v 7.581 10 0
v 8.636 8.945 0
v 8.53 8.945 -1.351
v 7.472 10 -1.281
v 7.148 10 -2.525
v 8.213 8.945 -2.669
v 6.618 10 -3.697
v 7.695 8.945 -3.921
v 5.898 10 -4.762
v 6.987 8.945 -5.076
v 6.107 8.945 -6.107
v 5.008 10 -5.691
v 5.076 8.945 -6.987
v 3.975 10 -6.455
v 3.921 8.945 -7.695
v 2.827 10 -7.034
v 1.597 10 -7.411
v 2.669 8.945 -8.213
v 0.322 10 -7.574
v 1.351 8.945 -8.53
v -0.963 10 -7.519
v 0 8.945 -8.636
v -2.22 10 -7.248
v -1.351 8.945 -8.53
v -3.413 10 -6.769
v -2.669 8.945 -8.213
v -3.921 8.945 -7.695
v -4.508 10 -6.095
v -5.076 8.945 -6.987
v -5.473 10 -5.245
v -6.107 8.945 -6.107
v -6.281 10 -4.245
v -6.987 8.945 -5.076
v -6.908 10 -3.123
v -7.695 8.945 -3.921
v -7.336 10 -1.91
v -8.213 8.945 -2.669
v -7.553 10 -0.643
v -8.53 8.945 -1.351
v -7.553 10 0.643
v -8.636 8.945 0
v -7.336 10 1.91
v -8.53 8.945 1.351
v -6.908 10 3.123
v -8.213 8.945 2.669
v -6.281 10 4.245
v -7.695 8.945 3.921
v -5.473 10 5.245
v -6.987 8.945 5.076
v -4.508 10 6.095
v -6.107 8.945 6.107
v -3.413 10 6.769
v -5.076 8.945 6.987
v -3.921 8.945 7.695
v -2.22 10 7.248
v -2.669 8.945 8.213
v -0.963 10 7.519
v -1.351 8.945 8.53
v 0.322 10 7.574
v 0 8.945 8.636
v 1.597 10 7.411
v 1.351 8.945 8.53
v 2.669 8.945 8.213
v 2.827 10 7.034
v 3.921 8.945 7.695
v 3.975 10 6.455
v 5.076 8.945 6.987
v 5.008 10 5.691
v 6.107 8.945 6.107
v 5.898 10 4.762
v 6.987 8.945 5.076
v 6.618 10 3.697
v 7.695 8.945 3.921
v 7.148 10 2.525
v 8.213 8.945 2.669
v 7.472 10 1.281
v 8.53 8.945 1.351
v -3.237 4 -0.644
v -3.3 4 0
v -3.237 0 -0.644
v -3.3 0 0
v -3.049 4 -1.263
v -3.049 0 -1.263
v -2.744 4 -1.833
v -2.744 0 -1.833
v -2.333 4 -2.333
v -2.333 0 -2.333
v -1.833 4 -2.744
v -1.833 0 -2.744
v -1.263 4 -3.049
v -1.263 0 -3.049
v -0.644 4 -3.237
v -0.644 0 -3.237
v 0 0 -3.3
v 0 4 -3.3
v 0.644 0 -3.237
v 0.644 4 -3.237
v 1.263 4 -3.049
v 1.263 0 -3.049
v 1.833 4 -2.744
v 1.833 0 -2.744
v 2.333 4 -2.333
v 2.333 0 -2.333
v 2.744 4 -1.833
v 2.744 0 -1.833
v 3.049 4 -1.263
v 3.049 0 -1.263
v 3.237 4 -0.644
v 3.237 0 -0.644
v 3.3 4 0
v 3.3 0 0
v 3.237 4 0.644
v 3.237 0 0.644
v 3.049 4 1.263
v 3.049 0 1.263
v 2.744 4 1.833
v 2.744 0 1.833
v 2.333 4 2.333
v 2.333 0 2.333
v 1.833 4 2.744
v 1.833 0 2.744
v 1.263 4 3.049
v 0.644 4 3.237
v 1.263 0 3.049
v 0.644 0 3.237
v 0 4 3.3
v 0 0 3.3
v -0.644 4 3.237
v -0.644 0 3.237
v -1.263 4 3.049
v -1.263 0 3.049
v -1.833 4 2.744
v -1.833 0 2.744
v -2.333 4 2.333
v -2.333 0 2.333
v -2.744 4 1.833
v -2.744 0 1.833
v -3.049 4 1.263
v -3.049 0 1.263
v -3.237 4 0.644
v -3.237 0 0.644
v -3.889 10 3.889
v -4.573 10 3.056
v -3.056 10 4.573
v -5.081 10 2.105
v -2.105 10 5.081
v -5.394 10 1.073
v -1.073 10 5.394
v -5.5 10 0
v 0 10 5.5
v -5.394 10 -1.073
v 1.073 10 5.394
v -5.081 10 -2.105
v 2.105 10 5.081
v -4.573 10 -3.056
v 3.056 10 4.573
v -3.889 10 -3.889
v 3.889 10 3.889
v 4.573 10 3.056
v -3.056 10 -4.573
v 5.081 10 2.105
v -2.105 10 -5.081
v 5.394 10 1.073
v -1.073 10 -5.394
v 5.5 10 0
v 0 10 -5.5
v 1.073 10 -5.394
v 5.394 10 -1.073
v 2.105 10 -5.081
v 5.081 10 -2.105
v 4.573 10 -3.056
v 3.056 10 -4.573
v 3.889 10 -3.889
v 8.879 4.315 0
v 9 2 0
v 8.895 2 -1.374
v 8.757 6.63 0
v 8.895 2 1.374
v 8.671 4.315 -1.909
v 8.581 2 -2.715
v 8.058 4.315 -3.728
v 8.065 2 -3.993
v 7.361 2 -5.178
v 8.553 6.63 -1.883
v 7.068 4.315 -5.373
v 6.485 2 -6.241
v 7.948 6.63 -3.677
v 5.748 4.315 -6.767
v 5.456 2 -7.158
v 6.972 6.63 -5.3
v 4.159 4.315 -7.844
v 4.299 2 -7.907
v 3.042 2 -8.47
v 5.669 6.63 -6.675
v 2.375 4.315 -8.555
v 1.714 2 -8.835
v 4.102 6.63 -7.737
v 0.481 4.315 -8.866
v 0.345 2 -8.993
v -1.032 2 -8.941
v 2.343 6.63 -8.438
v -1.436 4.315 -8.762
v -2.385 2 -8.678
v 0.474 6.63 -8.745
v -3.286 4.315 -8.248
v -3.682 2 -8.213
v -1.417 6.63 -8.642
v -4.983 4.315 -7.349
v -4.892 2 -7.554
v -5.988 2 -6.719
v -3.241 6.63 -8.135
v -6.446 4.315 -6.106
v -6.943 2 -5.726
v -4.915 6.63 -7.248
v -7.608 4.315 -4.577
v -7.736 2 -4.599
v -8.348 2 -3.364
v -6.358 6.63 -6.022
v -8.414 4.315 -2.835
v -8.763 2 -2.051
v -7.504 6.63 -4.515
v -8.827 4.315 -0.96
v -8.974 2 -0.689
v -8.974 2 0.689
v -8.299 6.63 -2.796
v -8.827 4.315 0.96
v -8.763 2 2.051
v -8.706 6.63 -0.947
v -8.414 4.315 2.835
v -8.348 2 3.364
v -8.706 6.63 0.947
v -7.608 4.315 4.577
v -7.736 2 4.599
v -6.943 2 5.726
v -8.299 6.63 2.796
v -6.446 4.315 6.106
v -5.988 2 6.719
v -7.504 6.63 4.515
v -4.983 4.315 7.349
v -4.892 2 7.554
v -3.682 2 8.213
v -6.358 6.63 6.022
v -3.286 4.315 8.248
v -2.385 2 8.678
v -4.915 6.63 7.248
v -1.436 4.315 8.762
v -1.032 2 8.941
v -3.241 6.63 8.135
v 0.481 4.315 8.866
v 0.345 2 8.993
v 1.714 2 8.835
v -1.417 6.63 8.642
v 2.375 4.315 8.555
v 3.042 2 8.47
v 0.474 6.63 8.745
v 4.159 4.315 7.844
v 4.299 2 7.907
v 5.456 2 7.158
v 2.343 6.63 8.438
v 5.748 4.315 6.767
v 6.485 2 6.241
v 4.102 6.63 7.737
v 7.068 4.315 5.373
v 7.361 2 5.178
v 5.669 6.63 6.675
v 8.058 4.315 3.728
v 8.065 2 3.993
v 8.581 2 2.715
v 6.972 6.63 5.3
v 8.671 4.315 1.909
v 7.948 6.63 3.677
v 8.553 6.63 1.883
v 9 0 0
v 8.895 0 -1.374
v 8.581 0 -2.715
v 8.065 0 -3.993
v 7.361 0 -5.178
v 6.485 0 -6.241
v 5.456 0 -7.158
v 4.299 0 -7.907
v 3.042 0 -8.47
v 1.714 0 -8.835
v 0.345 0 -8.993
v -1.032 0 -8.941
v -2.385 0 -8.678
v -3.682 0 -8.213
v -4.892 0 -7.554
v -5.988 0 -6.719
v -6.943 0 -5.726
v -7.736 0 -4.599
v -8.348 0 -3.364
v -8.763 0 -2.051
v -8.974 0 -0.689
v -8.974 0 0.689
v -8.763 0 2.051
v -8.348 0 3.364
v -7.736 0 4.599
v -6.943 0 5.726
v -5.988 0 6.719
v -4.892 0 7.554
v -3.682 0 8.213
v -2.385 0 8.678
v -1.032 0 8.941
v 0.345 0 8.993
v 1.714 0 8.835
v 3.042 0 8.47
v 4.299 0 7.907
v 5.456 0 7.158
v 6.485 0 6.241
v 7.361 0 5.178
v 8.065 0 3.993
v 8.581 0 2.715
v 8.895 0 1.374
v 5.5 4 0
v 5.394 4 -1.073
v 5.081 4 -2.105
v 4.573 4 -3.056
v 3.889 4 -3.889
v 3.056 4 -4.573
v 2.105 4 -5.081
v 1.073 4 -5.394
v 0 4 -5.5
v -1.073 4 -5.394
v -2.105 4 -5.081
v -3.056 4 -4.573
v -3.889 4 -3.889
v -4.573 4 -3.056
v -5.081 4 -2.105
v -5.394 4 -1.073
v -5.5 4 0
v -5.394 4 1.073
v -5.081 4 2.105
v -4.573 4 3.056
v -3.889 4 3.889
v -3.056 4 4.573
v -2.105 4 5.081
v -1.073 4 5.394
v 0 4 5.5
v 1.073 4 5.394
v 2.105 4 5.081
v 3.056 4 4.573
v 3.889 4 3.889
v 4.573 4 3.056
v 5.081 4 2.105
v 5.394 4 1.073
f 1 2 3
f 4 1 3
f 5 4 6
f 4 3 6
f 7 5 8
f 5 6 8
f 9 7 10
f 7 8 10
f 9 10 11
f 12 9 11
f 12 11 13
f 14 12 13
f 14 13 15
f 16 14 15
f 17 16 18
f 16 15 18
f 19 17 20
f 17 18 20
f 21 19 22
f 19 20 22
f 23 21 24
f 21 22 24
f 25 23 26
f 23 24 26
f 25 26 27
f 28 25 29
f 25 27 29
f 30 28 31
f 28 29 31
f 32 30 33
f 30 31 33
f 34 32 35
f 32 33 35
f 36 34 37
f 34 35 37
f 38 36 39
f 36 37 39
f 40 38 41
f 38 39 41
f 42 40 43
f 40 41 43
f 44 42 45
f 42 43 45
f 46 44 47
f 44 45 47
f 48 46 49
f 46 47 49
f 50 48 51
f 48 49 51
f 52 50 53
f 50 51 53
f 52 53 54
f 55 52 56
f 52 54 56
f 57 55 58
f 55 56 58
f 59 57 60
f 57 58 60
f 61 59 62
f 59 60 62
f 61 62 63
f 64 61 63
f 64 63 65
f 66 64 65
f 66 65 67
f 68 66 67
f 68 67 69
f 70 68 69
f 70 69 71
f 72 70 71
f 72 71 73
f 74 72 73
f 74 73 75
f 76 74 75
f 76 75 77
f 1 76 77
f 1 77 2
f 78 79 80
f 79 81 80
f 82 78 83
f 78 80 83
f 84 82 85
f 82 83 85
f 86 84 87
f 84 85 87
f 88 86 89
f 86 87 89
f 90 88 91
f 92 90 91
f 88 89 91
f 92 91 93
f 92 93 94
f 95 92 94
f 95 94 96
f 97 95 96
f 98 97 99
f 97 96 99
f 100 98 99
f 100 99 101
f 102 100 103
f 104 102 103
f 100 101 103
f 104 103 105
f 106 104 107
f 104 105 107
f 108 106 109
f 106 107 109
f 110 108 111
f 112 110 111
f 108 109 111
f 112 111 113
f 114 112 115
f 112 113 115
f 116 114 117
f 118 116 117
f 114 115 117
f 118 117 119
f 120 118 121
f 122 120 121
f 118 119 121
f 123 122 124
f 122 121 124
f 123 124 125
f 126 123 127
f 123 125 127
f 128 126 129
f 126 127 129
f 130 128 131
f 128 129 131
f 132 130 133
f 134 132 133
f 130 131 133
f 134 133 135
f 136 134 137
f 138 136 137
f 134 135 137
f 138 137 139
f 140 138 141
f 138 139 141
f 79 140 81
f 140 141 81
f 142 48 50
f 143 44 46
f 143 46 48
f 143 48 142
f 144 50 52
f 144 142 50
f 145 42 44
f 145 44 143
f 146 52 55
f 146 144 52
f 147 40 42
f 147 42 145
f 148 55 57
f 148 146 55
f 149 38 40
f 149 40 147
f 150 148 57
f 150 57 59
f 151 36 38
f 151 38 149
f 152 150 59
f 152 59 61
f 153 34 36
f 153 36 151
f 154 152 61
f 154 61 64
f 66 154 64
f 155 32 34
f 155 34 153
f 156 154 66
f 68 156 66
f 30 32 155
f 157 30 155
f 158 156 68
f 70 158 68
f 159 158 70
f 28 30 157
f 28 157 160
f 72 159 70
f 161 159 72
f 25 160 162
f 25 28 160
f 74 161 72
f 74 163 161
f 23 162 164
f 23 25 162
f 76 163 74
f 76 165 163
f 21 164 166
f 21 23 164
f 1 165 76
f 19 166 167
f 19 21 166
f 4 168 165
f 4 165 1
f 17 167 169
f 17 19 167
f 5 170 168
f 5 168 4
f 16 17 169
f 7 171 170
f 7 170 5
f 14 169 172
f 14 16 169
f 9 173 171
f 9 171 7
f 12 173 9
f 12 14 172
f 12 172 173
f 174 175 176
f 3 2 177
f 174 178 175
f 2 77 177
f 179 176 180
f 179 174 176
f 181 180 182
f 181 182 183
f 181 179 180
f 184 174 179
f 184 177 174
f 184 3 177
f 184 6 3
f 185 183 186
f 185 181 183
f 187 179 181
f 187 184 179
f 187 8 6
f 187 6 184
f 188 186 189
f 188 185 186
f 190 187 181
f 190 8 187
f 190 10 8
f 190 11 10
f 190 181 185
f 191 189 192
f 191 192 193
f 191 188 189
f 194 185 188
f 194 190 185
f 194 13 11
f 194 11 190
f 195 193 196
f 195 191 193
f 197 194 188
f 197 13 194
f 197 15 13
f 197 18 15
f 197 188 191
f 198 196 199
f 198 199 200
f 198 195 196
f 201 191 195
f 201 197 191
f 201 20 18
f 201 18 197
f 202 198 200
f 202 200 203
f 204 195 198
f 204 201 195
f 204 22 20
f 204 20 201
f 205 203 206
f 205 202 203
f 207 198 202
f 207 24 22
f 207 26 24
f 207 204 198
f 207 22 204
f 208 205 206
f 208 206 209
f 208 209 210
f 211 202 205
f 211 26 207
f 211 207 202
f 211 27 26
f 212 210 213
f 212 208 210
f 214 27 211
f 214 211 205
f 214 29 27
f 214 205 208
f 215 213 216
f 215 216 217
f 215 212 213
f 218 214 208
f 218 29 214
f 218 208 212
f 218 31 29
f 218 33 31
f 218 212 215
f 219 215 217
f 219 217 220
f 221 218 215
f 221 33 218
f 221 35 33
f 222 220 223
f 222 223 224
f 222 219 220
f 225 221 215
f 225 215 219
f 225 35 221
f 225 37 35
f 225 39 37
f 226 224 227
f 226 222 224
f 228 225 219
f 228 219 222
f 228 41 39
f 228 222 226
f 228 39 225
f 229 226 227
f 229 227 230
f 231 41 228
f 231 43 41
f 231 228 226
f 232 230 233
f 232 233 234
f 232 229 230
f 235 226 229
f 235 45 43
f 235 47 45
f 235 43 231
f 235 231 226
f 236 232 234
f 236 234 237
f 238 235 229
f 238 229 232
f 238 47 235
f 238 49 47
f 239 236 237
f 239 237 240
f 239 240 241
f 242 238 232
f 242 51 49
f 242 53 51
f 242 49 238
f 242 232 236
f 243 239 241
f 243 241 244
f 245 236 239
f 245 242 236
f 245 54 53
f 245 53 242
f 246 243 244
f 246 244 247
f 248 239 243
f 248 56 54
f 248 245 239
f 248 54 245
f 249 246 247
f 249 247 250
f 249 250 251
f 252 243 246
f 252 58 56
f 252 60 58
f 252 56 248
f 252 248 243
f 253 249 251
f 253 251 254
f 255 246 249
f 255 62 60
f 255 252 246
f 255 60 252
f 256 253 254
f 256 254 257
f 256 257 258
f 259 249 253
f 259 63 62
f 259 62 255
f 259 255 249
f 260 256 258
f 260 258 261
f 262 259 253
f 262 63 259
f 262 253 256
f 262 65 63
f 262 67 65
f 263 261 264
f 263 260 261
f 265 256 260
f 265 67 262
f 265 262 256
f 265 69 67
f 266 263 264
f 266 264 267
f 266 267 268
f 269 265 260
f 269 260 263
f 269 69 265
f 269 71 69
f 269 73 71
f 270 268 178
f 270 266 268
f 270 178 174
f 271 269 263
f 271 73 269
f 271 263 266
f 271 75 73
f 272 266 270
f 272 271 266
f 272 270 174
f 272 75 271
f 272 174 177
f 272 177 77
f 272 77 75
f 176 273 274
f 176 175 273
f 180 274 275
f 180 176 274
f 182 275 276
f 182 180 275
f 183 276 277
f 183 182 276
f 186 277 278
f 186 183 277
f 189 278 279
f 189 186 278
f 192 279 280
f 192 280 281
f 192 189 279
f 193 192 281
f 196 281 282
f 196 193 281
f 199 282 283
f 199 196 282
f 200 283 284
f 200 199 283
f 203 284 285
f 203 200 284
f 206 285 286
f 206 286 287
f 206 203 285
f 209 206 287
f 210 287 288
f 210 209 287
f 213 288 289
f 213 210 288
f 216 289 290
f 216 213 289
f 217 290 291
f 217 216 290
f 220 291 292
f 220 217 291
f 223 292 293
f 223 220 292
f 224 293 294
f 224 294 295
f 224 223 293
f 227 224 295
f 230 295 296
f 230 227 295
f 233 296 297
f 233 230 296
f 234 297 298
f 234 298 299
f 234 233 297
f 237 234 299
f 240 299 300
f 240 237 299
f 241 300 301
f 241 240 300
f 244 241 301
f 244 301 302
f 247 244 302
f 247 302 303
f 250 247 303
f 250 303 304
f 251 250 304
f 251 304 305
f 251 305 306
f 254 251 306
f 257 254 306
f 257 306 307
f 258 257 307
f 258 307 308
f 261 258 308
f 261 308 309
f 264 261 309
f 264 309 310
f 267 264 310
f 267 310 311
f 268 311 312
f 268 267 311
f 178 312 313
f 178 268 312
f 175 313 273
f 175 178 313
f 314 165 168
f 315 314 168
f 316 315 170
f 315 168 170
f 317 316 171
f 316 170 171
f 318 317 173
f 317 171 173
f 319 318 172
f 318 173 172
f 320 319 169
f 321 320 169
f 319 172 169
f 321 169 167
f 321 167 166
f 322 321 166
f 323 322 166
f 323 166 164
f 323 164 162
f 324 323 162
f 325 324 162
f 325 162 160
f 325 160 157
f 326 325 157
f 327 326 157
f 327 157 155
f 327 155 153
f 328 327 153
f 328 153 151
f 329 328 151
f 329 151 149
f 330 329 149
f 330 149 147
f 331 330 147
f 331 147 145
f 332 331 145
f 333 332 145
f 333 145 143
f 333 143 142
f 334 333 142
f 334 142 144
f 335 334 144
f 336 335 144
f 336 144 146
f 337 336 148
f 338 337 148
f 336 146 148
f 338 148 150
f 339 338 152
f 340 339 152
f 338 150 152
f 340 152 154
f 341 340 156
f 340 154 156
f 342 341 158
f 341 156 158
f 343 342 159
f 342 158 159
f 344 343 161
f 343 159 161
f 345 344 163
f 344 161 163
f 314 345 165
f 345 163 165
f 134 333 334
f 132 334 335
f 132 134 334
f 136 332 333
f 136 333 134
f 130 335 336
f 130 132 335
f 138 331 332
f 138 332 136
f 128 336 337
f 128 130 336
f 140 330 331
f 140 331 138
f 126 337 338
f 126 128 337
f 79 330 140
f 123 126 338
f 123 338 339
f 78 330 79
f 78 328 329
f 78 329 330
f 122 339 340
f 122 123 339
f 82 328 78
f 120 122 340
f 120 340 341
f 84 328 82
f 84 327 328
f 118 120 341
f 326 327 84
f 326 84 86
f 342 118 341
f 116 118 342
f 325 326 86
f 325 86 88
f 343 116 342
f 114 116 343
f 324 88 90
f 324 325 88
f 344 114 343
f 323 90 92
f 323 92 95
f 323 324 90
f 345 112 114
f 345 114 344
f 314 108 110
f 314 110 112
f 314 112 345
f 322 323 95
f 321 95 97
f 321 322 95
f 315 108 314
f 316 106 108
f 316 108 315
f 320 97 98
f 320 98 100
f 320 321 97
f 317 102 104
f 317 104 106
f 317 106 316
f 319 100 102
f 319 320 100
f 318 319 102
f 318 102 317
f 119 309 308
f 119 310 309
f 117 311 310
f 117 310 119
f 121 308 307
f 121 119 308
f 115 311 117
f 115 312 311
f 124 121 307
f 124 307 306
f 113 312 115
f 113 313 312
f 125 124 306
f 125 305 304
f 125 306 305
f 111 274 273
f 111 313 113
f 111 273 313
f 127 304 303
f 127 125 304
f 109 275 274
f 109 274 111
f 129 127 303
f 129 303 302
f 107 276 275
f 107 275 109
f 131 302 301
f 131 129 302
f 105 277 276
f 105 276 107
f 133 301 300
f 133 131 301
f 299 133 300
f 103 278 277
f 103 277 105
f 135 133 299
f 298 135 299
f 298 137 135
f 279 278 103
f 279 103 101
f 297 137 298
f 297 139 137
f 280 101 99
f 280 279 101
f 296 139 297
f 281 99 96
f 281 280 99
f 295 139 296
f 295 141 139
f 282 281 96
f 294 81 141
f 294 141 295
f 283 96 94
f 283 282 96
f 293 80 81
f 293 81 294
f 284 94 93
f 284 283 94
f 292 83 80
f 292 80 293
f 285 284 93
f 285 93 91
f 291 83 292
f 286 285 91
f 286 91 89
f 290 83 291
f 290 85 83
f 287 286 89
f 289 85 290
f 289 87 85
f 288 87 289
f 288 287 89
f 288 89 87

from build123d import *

# Parameters (mm, degrees)
HOLE_WIZARD_1_D           = 6.6
HOLE_WIZARD_1_CBORE_D     = 11
HOLE_WIZARD_1_CBORE_DEPTH = 6
CHAMFER_1_SIZE            = 1
CHAMFER_1_SIZE2           = 1.056754503


with BuildPart() as part:
    # 草图1 → 旋转1 (revolve)
    with BuildSketch(Plane.XY):
        Polygon((0, 0), (9, 0), (9, 2), (8.580737766, 10), (0, 10), align=None)
    revolve(axis=Axis((0, -1000, 0), (0, 1, 0)))

    # 打孔尺寸根据内六角圆柱头螺钉的类型1 (through all)
    with Locations(Plane(origin=(0, 10, 0), x_dir=(1, 0, 0), z_dir=(0, 1, 0))):
        with Locations((0, 0)):
            CounterBoreHole(HOLE_WIZARD_1_D / 2, HOLE_WIZARD_1_CBORE_D / 2, HOLE_WIZARD_1_CBORE_DEPTH)

    # 倒角1
    chamfer_1_edges = [part.edges().sort_by_distance(p)[0] for p in [
        (-8.580737766, 10, 0),
    ]]
    chamfer_1_side = [part.faces().sort_by_distance(p)[0] for p in [
        (-8.338037851, 10, 0),
    ]]
    chamfer(chamfer_1_edges, length=CHAMFER_1_SIZE, length2=CHAMFER_1_SIZE2, reference=chamfer_1_side[0])


solid = part.part
